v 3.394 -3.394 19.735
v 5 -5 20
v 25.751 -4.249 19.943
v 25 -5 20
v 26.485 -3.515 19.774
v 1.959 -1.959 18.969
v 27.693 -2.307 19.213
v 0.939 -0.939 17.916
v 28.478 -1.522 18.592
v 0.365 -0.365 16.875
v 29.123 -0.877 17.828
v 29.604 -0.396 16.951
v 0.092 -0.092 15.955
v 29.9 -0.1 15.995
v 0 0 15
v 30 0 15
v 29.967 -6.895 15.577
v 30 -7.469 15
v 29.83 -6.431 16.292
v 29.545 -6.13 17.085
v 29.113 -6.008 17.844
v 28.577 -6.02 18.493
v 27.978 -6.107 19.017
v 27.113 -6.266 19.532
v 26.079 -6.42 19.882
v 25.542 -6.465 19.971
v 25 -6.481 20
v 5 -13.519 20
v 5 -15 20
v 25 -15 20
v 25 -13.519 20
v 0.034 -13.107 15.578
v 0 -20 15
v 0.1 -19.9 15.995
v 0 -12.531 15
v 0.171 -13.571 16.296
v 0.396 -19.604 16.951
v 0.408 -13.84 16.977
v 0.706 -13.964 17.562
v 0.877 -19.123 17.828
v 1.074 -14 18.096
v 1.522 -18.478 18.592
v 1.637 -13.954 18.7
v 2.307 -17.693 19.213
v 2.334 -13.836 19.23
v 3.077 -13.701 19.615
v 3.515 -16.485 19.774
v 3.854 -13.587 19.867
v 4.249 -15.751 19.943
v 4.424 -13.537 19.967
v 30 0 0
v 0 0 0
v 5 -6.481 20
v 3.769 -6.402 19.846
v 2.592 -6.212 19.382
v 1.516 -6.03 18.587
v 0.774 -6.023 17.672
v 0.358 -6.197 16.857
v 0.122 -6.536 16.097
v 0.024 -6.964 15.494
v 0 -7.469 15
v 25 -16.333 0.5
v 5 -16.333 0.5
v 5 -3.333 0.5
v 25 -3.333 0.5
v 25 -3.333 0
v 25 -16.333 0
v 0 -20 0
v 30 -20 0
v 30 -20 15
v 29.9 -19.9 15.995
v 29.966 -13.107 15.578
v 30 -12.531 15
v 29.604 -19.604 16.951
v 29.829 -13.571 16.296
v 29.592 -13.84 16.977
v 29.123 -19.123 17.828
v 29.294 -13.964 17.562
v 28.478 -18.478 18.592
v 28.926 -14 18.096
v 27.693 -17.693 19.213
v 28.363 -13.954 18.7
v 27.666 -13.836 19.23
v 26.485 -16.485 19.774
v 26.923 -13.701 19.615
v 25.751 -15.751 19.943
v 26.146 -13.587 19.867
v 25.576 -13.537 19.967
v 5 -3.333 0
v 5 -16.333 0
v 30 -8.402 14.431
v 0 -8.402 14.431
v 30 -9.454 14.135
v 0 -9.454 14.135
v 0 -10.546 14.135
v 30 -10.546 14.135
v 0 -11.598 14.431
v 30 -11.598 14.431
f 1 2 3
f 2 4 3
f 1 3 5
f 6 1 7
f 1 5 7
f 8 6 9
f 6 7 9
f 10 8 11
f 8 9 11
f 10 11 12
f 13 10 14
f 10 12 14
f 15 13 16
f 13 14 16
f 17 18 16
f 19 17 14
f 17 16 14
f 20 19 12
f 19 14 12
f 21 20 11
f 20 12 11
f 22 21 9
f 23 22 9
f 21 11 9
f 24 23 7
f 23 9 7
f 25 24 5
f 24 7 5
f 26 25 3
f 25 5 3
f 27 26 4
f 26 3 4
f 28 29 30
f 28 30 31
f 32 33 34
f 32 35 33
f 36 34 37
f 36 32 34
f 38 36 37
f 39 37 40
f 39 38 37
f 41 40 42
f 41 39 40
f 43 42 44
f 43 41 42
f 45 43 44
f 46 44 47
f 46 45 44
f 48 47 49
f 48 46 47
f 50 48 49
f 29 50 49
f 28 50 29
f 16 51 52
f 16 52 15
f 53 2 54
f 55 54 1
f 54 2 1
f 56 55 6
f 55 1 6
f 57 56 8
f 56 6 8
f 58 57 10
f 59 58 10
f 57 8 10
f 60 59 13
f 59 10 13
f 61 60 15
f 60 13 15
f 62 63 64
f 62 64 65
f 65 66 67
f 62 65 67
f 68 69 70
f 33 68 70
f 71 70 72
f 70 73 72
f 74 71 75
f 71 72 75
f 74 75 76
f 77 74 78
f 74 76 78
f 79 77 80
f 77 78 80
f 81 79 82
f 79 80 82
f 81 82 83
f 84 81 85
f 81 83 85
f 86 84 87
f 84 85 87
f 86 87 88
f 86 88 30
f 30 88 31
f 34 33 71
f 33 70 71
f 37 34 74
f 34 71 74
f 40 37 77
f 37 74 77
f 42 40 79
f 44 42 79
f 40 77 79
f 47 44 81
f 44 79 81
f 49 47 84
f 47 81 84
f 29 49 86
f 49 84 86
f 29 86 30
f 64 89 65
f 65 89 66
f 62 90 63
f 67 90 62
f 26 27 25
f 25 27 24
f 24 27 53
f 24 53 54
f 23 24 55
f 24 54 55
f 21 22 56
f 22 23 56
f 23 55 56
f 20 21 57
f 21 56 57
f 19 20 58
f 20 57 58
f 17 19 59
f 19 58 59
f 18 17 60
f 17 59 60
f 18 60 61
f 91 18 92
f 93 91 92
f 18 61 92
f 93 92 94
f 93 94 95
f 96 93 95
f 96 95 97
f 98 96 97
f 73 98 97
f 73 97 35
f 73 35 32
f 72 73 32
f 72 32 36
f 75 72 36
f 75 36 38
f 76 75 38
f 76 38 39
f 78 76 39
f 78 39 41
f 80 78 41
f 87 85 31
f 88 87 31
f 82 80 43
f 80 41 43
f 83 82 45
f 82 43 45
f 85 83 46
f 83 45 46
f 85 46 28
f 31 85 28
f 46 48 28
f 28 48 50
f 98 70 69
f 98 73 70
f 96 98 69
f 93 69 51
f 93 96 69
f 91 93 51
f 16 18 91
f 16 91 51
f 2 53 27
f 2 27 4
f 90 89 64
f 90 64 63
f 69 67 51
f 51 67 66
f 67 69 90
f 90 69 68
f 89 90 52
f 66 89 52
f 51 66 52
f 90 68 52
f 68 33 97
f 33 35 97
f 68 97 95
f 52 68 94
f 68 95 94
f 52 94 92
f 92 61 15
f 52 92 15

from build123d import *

# Parameters (mm, degrees)
F0_W     = 20
F0_H     = 20
F1_DEPTH = 30
F3_D     = 8
F3_DEPTH = 50
F3_TIP   = 2.4034424761
F4_R     = 5
F5_W     = 20
F5_H     = 13
F6_DEPTH = 0.5


# Not quite as in the source:
# - a feature names something its author has since deleted; it is built from what else it names


with BuildPart() as f1:
    # F0 (on Right) → F1 (new body)
    with BuildSketch(Plane.YZ):
        with Locations((-10, 10)):
            Rectangle(F0_W, F0_H)
    extrude(amount=F1_DEPTH)

    # F3
    with Locations(Plane.YZ.offset(30)):
        with Locations((-10, 18.097827211)):
            Hole(F3_D / 2, depth=F3_DEPTH)
            with Locations((0, 0, -(F3_DEPTH + F3_TIP / 2))):  # 118° drill point
                Cone(0, F3_D / 2, F3_TIP, mode=Mode.SUBTRACT)

    # F4
    f4_edges = [f1.edges().sort_by_distance(p)[0] for p in [
        (30, -3.240615, 20),
        (30, -16.759385, 20),
        (15, -20, 20),
        (15, 0, 20),
        (0, -16.759385, 20),
        (0, -3.240615, 20),
    ]]
    fillet(f4_edges, radius=F4_R)

    # F5 (on face) → F6 (cut)
    with BuildSketch(Plane(origin=(0, 0, 0), x_dir=(1, 0, 0), z_dir=(0, 0, -1))):
        with Locations((15, 9.8333333333)):
            Rectangle(F5_W, F5_H)
    extrude(amount=-F6_DEPTH, mode=Mode.SUBTRACT)


solid = f1.part
